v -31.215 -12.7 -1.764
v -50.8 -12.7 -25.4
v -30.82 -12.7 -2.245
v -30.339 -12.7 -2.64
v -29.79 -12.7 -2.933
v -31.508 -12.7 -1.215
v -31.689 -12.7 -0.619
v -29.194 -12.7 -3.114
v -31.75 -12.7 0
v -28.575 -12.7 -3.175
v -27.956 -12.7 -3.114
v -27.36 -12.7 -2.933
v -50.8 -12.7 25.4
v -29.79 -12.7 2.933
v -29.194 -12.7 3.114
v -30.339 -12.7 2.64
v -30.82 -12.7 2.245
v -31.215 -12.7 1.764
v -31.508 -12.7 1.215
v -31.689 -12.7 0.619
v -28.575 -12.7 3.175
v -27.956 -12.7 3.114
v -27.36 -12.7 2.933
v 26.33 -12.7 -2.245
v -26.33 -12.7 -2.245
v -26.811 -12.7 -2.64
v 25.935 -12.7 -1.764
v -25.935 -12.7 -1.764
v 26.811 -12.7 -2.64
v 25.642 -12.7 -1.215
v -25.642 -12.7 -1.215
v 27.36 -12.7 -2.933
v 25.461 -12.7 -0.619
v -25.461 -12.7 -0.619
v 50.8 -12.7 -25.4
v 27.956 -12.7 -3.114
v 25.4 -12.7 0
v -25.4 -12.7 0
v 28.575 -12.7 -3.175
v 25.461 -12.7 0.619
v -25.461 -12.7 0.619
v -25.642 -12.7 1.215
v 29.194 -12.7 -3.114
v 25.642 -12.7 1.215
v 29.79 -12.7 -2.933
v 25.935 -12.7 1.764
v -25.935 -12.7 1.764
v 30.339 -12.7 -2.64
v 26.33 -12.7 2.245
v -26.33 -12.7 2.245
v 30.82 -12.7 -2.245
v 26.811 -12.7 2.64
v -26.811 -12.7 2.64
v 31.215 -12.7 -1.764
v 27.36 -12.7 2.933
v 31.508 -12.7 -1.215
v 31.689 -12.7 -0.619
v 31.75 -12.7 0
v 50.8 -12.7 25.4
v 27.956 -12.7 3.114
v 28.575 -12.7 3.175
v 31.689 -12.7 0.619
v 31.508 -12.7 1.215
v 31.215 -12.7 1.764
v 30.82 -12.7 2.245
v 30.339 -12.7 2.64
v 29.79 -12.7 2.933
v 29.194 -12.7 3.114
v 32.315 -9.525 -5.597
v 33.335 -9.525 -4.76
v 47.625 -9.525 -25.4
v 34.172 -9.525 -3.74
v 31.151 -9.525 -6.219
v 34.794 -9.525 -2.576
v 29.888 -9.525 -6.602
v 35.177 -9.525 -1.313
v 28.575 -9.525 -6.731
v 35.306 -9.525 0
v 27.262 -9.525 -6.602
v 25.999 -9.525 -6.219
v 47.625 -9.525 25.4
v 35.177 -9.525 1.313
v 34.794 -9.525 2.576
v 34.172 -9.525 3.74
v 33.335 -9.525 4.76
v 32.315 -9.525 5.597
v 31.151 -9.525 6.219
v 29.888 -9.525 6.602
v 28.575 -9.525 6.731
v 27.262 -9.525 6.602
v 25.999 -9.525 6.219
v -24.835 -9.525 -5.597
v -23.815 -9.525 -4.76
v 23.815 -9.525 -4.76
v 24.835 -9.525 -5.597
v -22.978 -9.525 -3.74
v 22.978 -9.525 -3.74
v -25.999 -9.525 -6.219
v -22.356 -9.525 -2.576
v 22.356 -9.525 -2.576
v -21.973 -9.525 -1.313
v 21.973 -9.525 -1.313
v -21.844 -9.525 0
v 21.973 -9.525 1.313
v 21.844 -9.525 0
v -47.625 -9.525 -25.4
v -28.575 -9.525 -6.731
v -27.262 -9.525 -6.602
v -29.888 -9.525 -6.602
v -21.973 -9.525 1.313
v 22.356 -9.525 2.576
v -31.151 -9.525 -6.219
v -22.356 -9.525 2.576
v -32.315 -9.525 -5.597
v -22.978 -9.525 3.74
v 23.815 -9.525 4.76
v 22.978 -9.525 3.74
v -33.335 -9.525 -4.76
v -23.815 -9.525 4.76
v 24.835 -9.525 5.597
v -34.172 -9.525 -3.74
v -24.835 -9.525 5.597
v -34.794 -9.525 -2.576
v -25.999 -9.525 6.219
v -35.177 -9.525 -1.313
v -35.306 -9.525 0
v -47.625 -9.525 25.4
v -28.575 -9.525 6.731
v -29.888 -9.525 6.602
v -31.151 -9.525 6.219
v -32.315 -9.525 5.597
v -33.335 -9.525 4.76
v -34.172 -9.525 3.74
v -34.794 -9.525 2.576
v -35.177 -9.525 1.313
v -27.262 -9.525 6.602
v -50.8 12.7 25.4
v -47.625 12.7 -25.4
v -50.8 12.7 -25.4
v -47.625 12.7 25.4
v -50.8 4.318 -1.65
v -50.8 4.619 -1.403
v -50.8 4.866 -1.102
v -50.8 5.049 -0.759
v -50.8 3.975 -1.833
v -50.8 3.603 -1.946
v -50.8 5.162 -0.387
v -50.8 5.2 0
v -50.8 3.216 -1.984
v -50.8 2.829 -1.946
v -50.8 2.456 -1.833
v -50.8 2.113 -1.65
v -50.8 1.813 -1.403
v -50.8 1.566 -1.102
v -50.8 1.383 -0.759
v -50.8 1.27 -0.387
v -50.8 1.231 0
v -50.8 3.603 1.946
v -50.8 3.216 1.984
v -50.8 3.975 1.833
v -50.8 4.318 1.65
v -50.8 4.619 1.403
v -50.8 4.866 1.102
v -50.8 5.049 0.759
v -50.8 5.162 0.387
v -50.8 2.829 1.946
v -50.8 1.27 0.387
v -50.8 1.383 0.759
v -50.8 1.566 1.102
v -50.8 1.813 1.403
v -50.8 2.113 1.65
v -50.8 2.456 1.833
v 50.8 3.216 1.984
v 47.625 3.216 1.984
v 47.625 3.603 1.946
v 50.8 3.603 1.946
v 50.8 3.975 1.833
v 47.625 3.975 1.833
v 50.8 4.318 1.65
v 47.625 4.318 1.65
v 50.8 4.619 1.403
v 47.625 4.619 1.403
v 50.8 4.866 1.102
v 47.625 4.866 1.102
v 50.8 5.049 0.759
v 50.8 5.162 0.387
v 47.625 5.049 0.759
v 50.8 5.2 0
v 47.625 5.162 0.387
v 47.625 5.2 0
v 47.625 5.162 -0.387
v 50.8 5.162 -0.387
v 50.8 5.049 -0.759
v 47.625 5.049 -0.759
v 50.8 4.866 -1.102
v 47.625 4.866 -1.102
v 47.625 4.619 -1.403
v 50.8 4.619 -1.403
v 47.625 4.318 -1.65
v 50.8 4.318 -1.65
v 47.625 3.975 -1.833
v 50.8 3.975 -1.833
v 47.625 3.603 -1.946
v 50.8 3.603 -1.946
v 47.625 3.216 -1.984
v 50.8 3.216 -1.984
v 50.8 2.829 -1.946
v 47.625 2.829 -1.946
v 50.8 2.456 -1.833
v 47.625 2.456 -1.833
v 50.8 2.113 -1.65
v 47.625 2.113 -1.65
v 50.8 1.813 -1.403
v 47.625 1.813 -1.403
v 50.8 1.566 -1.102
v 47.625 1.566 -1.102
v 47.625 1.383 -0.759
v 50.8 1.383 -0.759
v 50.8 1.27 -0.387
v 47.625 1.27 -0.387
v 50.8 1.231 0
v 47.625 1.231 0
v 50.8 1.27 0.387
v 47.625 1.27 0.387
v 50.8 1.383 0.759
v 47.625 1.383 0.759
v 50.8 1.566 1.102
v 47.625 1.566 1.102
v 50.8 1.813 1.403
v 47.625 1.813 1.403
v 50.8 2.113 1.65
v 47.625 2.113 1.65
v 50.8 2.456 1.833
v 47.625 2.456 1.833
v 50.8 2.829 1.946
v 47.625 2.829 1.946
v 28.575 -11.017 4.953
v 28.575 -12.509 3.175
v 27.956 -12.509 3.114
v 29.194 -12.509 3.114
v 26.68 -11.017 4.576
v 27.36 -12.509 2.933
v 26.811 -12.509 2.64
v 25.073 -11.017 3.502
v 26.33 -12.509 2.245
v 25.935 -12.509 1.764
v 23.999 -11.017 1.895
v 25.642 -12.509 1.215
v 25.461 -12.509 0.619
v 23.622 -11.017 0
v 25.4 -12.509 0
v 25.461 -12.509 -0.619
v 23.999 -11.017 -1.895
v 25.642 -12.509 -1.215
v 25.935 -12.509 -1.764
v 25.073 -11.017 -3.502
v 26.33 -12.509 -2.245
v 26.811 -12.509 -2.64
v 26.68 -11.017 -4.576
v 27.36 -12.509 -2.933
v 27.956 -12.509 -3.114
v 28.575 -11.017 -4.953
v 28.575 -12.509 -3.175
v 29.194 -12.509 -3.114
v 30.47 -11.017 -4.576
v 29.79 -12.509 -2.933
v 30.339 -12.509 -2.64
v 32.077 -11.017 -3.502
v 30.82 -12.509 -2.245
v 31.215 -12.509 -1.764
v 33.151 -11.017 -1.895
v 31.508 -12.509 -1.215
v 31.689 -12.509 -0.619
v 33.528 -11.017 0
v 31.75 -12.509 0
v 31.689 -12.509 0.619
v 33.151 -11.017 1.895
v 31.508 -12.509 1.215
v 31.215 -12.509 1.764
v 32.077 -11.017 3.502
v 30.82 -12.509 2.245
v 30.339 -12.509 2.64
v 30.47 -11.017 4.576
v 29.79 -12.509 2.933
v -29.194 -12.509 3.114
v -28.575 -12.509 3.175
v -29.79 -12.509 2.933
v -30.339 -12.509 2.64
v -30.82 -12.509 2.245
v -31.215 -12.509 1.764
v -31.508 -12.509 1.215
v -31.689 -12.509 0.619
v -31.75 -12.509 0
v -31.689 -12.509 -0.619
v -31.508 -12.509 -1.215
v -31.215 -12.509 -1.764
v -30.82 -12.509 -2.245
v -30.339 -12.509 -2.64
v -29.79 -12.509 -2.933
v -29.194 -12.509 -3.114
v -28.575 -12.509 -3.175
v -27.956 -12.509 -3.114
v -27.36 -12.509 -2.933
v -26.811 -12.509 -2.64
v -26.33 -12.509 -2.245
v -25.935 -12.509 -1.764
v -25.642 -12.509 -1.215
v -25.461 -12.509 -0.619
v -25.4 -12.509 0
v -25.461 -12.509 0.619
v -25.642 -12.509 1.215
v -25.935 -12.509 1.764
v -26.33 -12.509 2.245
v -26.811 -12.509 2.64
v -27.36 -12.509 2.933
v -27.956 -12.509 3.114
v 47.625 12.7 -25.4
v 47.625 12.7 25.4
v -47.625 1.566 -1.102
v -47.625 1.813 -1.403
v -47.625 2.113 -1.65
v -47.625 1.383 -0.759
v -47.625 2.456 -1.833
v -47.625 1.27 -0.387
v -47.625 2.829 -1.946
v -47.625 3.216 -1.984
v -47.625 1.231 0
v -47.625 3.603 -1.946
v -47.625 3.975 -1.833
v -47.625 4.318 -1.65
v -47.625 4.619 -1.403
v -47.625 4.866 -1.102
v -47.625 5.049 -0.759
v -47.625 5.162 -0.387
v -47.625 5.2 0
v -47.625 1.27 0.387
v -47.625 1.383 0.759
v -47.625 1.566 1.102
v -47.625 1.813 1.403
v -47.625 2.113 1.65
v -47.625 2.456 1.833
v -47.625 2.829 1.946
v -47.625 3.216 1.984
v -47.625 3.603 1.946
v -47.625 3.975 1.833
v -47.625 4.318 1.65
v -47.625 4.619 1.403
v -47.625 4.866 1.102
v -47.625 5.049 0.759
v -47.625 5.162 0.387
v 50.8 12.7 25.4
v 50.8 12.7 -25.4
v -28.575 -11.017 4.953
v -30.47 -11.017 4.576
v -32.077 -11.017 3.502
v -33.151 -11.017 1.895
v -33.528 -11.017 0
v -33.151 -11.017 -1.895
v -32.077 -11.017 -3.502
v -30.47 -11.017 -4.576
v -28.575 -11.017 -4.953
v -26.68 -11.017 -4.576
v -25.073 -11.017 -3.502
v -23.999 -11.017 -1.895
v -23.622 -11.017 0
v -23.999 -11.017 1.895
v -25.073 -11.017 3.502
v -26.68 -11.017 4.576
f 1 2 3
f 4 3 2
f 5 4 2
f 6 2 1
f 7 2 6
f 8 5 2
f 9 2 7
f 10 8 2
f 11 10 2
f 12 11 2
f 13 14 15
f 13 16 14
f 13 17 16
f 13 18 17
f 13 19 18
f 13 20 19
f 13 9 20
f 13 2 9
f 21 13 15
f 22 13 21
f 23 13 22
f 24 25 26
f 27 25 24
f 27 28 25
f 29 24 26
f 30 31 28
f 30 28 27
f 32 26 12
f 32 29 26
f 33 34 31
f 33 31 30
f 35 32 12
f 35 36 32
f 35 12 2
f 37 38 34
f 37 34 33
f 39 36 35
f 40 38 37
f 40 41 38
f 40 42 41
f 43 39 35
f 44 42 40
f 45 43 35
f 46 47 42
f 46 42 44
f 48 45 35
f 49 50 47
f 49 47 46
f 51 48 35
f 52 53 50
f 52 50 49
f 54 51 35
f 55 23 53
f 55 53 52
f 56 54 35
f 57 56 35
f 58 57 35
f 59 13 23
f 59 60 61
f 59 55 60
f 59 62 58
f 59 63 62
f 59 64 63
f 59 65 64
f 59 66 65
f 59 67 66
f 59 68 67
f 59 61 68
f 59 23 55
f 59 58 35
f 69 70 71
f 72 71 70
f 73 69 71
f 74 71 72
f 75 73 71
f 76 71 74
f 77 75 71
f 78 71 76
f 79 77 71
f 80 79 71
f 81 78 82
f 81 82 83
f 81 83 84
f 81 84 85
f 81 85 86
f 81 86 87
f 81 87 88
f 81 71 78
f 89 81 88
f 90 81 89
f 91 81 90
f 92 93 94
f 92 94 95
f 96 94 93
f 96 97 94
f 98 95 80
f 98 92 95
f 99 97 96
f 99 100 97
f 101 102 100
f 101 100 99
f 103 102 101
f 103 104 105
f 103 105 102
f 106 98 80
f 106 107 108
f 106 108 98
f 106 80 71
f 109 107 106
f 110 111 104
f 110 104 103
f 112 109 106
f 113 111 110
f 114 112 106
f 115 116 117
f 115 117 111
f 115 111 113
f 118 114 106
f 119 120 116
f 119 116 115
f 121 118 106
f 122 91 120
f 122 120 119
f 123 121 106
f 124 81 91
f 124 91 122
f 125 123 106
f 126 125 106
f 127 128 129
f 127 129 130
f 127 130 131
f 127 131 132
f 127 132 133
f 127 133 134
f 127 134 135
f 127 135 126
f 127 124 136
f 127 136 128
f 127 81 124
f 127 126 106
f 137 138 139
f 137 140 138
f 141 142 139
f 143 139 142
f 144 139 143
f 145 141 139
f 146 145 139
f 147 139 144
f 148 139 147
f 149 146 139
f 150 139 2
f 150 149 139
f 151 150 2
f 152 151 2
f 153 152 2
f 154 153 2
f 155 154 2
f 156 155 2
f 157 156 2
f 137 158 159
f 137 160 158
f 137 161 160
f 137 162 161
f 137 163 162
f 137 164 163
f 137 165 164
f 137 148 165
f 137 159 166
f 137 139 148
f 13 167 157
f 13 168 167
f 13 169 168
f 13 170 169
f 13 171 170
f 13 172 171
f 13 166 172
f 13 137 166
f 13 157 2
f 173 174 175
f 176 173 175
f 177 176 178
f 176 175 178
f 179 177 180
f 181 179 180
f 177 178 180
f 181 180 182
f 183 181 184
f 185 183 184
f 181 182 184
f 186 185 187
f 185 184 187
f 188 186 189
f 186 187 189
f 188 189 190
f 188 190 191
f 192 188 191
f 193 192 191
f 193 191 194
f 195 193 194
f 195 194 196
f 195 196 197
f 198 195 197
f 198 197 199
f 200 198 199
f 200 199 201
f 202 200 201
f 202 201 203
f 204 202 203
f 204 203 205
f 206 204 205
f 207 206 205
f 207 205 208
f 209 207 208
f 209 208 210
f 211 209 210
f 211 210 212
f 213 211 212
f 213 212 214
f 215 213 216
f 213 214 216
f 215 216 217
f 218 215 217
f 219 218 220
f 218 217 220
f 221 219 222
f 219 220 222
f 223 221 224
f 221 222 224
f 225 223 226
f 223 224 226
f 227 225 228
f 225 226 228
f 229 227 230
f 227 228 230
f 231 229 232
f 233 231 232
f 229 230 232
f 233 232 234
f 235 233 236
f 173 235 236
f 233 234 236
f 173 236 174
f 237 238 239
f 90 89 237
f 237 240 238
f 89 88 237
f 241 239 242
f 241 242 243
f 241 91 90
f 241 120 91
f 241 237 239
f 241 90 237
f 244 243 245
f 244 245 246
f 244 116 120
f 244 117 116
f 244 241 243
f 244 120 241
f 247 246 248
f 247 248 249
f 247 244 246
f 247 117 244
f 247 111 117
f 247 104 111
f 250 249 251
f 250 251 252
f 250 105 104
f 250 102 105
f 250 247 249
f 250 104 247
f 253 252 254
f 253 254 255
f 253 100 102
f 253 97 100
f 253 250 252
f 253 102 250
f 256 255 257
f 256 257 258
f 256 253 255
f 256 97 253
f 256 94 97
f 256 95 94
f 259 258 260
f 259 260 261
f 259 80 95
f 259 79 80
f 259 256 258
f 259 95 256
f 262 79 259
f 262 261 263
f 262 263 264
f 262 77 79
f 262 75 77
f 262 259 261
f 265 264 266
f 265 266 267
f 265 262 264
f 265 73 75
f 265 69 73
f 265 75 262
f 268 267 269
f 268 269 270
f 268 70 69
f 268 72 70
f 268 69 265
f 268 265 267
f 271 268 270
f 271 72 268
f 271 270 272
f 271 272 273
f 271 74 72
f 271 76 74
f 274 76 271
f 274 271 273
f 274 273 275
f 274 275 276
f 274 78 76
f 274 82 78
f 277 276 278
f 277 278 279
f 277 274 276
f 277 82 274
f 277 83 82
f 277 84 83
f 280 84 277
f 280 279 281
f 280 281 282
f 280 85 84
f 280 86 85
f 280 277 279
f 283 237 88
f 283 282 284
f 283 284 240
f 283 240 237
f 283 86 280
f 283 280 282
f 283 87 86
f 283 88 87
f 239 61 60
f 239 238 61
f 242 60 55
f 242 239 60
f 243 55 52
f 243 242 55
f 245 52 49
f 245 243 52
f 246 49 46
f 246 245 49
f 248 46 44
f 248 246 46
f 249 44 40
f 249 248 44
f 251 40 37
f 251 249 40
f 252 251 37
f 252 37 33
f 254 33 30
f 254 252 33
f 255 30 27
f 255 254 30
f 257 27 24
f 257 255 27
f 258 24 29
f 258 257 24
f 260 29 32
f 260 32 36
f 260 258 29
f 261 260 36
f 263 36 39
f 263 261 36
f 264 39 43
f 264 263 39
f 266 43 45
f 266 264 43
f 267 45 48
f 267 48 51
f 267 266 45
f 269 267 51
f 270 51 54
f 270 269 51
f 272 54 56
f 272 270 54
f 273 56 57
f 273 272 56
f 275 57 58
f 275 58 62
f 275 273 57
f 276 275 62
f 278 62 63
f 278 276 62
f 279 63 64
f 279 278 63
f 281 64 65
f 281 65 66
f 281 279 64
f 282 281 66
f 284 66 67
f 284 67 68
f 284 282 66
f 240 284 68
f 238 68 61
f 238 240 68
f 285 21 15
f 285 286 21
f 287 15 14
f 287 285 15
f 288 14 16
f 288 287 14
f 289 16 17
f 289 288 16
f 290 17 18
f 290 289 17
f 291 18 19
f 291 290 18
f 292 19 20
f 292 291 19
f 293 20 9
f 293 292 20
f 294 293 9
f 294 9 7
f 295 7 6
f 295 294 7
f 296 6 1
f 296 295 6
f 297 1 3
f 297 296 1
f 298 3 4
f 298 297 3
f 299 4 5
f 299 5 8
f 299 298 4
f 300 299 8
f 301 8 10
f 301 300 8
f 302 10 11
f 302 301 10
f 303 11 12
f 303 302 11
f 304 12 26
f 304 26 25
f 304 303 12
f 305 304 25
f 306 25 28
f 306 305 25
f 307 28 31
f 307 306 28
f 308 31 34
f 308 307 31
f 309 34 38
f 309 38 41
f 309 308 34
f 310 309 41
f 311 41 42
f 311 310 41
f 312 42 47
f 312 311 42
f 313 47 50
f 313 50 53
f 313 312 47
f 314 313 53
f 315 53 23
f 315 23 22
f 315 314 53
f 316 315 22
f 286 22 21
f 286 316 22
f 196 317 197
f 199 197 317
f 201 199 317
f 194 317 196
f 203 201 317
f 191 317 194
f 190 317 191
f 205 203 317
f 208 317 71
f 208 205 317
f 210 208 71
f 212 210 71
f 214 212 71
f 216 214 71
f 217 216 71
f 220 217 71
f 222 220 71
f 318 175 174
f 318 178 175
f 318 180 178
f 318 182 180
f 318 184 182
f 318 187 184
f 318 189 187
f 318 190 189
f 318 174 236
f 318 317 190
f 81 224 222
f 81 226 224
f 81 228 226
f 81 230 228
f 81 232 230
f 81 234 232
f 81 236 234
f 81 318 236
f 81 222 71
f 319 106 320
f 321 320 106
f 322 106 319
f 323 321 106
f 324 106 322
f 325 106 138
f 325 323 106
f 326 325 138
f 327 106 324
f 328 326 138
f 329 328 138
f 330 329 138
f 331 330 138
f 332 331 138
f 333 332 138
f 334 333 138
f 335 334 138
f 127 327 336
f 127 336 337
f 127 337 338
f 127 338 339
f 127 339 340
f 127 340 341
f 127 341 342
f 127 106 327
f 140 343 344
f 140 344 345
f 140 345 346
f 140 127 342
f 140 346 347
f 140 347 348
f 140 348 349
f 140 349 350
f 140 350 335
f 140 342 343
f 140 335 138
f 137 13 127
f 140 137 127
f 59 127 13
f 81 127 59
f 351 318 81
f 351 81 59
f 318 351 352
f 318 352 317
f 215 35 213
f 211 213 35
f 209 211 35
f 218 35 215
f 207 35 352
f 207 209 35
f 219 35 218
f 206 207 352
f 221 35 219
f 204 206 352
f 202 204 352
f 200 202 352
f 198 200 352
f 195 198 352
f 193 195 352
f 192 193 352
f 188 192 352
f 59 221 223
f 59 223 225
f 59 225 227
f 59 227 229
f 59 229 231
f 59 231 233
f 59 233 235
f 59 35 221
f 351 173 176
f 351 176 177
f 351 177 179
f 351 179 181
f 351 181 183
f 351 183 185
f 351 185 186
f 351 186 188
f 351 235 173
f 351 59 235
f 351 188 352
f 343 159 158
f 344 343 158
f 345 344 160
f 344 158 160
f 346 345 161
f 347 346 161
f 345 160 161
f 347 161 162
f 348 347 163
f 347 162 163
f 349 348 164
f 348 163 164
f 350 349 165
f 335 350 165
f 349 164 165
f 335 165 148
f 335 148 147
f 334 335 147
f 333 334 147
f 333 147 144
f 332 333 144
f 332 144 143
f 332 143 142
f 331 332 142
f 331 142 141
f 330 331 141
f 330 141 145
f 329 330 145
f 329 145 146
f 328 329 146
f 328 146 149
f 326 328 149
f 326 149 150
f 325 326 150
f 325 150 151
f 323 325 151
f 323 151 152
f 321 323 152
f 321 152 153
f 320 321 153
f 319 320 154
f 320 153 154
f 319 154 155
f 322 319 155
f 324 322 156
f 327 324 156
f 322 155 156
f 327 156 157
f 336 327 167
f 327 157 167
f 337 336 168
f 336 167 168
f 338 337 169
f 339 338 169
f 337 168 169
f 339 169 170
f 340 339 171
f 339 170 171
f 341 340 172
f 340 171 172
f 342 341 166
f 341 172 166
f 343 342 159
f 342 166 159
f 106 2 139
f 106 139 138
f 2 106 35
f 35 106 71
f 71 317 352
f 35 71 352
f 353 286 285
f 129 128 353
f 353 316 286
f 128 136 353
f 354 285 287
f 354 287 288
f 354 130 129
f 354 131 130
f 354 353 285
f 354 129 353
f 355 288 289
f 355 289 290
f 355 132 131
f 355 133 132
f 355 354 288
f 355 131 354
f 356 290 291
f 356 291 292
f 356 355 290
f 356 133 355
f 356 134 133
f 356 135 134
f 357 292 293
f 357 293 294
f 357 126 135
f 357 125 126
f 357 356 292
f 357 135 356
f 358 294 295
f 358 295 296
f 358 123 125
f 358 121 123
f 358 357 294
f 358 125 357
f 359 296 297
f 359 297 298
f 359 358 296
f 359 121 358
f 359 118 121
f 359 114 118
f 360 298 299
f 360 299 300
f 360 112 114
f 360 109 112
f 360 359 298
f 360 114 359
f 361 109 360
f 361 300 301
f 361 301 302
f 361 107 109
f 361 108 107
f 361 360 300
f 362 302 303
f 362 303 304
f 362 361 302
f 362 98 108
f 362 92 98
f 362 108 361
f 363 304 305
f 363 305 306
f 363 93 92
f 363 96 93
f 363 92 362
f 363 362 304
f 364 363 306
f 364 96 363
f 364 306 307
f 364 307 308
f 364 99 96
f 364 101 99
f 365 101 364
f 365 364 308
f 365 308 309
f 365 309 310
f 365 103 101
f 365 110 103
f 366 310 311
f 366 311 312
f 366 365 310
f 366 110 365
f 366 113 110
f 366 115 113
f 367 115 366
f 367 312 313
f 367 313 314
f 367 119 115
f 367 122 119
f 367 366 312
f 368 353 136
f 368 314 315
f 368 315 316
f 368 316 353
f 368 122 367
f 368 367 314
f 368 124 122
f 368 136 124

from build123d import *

# Parameters (mm, degrees)
BOSS_EXTRUDE2_DEPTH                  = 25.4
F_1_4_0_25_DIAMETER_HOLE1_AT_2_COUNT = 2
F_1_4_0_25_DIAMETER_HOLE1_AT_2_PITCH = 57.15
F_5_32_0_15625_DIAMETER_HOLE1_D      = 3.96875


with BuildPart() as part:
    # Sketch3 → Boss-Extrude2 (new, symmetric)
    with BuildSketch(Plane.XY):
        Polygon((-50.8, 12.7), (-50.8, -12.7), (50.8, -12.7), (50.8, 12.7), (47.625, 12.7), (47.625, -9.525), (-47.625, -9.525), (-47.625, 12.7), align=None)
    extrude(amount=BOSS_EXTRUDE2_DEPTH, both=True)

    # Sketch6 → 1/4 (0.25) Diameter Hole1 (revolve, cut)
    with BuildSketch(Plane(origin=(-28.575, -9.525, 0), x_dir=(0, 0, 1), z_dir=(1, 0, 0))):
        Polygon((0, 0), (0, 3.175), (3.175, 3.175), (3.175, 2.983838288), (6.731, 0), align=None)
    f_1_4_0_25_diameter_hole1 = revolve(axis=Axis((-28.575, -3.175, 0), (0, -1, 0)), mode=Mode.SUBTRACT)

    # 1/4 (0.25) Diameter Hole1 at 2: 1/4 (0.25) Diameter Hole1 ×2
    with Locations(*[(i * F_1_4_0_25_DIAMETER_HOLE1_AT_2_PITCH, 0, 0) for i in range(1, F_1_4_0_25_DIAMETER_HOLE1_AT_2_COUNT)]):
        add(f_1_4_0_25_diameter_hole1, mode=Mode.SUBTRACT)

    # 5/32 (0.15625) Diameter Hole1 (through all)
    with Locations(Plane(origin=(50.8, 0, 0), x_dir=(0, 0, -1), z_dir=(1, 0, 0))):
        with Locations((0, 3.215843377)):
            Hole(F_5_32_0_15625_DIAMETER_HOLE1_D / 2)


solid = part.part
